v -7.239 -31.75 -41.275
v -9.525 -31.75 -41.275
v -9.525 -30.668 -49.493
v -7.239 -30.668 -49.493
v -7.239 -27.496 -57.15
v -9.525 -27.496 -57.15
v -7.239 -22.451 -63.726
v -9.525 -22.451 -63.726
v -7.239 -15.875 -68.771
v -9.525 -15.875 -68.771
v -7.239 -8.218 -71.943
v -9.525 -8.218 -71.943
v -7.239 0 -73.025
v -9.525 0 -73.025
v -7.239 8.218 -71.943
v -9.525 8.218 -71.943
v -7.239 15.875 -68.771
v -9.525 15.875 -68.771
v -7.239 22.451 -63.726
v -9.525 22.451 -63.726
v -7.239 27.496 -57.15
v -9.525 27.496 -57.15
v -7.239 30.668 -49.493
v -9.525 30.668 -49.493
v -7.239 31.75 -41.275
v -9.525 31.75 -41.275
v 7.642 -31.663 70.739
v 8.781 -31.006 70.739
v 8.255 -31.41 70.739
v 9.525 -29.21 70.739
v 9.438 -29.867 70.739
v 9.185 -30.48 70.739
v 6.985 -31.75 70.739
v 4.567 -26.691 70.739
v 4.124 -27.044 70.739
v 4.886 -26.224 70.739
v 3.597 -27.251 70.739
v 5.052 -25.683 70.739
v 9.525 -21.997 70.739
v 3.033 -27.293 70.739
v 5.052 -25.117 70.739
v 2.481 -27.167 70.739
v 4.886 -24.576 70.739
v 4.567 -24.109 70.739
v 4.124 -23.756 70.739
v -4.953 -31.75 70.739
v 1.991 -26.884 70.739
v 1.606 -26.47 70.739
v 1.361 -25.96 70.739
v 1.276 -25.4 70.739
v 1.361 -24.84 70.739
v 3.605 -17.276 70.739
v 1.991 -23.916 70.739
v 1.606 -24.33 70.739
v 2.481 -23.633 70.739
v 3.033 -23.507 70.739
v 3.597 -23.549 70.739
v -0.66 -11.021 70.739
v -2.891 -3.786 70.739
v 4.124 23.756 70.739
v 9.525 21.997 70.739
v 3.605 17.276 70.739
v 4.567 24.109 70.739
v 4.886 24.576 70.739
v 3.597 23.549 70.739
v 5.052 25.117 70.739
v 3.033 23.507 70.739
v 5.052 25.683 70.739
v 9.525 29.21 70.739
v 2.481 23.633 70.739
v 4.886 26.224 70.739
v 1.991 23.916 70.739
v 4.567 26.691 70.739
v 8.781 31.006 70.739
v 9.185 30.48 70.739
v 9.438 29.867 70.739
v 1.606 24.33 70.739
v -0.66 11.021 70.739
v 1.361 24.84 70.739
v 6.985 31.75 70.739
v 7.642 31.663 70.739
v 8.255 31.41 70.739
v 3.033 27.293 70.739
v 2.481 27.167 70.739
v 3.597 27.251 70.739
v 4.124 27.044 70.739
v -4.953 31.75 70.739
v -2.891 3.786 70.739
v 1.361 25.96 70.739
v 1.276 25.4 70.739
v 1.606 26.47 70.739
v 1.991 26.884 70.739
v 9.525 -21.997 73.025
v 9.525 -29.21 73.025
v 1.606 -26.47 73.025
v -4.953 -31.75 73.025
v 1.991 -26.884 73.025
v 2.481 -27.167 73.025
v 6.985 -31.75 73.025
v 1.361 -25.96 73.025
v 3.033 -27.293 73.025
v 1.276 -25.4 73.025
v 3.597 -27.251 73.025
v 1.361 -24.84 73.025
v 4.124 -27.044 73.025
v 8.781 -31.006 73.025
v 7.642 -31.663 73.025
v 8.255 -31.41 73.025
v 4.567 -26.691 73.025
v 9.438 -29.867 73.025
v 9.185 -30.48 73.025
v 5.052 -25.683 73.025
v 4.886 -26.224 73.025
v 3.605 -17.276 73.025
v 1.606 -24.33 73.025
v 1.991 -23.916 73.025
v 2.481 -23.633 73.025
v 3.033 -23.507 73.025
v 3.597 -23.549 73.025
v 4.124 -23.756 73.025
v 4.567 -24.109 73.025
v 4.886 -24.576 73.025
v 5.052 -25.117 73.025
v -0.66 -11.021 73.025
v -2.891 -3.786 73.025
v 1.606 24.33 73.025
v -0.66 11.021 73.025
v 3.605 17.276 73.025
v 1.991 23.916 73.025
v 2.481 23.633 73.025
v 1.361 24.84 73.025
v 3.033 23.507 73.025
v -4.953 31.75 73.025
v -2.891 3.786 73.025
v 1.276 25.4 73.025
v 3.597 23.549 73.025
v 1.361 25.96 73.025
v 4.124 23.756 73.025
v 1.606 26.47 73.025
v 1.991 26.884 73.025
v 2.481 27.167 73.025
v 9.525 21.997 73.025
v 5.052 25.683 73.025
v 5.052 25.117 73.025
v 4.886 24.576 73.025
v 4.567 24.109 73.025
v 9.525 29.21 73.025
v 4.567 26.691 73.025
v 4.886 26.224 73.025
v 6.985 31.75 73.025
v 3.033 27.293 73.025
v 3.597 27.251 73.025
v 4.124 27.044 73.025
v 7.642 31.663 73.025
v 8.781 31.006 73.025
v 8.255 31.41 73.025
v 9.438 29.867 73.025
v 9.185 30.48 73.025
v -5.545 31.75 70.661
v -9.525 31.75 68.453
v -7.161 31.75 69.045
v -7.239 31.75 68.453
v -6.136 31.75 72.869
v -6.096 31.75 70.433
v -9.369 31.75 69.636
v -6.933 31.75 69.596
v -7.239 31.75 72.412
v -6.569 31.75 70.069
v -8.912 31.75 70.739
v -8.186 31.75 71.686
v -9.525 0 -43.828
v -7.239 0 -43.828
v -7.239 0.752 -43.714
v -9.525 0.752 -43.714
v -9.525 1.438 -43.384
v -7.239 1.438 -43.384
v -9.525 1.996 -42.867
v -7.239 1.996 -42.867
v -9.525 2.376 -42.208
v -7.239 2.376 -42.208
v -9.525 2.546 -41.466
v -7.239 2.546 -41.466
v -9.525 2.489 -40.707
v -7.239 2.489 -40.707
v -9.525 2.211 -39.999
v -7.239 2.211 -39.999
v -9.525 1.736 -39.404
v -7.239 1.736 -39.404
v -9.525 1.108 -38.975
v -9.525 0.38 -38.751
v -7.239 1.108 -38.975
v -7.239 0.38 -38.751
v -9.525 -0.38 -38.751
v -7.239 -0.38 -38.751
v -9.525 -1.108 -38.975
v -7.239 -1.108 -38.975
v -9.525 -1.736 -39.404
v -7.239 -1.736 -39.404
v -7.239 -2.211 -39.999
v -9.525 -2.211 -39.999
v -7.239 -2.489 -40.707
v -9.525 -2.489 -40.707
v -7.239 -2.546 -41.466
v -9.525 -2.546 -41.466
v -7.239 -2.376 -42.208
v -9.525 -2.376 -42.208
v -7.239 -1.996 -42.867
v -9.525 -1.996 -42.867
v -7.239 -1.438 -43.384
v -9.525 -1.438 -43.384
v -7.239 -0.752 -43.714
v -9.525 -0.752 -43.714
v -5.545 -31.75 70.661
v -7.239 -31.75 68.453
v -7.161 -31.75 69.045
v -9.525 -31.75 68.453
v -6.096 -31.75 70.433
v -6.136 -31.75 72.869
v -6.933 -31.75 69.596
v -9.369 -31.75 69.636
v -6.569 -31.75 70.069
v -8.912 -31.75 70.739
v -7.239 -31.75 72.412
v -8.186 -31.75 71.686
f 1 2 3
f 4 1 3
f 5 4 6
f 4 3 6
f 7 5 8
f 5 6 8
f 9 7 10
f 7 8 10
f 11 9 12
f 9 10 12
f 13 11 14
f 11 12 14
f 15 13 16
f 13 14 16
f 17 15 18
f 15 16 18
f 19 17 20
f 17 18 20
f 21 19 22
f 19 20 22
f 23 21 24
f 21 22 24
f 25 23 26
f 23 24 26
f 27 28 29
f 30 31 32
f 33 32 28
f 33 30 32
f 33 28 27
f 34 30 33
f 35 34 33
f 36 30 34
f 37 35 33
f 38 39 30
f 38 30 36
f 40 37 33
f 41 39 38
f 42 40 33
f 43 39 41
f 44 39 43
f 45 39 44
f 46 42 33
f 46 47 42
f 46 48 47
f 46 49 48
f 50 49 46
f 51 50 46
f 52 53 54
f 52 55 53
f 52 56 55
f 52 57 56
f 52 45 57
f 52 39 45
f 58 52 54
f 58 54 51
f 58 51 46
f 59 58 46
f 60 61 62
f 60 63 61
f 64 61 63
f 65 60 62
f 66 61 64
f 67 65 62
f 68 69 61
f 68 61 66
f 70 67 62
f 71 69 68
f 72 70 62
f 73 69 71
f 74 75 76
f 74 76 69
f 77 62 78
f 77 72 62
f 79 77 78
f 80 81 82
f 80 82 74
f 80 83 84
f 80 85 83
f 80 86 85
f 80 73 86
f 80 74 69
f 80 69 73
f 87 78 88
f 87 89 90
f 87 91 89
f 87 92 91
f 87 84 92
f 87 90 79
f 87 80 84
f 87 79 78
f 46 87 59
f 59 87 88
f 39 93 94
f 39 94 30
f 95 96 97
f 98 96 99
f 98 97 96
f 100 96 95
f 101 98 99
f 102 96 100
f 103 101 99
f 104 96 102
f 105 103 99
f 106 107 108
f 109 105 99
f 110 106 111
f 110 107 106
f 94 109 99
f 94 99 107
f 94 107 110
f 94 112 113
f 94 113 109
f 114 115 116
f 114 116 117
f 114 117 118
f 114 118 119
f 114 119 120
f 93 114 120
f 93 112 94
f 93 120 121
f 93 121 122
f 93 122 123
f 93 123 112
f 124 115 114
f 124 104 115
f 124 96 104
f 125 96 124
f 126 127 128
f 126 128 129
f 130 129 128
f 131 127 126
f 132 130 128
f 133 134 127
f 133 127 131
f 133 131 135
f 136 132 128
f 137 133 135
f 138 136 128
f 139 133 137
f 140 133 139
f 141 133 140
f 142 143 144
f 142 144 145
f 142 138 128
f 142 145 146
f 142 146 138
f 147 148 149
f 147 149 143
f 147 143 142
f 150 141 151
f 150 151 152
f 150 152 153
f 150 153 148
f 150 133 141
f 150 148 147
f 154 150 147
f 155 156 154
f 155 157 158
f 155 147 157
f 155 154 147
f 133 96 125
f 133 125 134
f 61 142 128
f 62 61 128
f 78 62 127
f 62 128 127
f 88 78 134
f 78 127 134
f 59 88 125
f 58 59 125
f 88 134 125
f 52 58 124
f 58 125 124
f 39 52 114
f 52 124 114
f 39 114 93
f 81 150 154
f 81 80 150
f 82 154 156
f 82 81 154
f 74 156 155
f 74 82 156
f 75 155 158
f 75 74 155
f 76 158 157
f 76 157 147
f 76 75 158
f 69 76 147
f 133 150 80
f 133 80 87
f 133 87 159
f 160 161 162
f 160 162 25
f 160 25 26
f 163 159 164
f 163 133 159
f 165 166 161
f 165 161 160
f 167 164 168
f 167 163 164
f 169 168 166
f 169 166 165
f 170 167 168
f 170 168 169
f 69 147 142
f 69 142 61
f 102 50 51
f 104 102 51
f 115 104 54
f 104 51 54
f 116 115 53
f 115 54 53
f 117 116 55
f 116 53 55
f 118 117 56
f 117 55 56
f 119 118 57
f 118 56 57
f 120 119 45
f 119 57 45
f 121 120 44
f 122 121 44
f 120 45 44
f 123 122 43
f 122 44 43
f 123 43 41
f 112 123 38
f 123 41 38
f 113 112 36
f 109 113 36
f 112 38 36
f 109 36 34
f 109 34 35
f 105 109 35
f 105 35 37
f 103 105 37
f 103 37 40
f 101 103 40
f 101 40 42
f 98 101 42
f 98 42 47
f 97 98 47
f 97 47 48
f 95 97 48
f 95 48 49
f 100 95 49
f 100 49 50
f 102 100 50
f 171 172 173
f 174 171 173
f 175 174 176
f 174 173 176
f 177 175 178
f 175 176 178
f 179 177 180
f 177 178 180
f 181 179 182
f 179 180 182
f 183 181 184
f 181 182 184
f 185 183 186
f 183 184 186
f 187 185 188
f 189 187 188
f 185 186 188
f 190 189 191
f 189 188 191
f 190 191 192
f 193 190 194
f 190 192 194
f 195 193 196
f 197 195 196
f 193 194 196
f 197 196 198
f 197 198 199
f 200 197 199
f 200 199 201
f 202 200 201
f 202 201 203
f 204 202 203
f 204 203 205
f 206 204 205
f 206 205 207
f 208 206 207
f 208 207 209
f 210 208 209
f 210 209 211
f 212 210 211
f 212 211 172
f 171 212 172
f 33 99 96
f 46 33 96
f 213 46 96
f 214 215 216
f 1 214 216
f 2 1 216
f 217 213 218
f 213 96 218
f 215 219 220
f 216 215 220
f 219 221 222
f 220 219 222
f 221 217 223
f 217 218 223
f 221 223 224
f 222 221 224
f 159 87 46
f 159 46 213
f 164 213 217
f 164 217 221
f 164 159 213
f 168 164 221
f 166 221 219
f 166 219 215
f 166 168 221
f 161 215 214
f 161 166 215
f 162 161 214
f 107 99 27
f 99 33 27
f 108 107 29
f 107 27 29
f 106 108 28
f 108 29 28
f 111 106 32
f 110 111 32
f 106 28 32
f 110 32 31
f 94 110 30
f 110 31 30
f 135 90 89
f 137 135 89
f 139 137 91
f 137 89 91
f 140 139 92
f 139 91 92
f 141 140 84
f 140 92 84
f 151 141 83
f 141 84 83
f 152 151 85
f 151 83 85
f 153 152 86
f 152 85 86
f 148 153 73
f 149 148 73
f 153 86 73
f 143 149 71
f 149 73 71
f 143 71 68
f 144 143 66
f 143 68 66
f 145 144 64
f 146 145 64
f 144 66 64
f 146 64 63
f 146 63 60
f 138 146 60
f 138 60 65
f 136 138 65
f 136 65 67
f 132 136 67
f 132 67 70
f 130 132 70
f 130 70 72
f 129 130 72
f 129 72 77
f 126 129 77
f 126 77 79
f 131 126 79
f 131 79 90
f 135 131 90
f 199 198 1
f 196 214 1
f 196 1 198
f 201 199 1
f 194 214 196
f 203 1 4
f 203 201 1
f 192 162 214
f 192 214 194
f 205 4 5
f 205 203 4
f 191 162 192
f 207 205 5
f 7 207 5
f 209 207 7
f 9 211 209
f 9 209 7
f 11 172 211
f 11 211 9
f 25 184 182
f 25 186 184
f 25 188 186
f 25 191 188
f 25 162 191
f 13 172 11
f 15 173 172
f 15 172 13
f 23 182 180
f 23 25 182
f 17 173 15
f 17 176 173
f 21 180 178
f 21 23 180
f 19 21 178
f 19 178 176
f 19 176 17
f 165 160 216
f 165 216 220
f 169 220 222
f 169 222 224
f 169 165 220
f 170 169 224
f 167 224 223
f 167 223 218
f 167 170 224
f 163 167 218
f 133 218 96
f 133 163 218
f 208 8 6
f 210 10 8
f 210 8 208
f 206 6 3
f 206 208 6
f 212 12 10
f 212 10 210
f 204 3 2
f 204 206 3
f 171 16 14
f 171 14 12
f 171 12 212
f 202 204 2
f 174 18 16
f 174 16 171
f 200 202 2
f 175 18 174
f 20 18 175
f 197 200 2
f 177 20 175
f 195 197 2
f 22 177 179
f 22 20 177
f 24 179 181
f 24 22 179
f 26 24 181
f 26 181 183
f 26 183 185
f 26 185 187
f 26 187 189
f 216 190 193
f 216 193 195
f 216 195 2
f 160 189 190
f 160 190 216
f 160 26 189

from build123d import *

# Parameters (mm, degrees)
BASE_FLANGE1_DEPTH           = 31.75
SKETCH6_R                    = 25.4
CUT_EXTRUDE1_DEPTH           = 150.764450471
FILLET1_R                    = 2.54
CUT_EXTRUDE2_DEPTH           = 82.875610685
F_7_0_201_DIAMETER_HOLE1_D   = 5.1054
F_25_0_1495_DIAMETER_HOLE1_D = 3.7973


# Sheet-metal steps are written as plain solids
with BuildPart() as part:
    # Sketch1 → Base-Flange1 (new, symmetric)
    with BuildSketch(Plane(origin=(0, 0, 0), x_dir=(-1, 0, 0), z_dir=(0, 1, 0))):
        with BuildLine():
            Line((9.525, -73.025), (9.525, 68.453))
            ThreePointArc((9.525, 68.453), (8.185892204, 71.685892204), (4.953, 73.025))
            Line((4.953, 73.025), (-9.525, 73.025))
            Line((-9.525, 73.025), (-9.525, 70.739))
            Line((-9.525, 70.739), (4.953, 70.739))
            ThreePointArc((4.953, 70.739), (6.569446102, 70.069446102), (7.239, 68.453))
            Line((7.239, 68.453), (7.239, -73.025))
            Line((7.239, -73.025), (9.525, -73.025))
        make_face()
    extrude(amount=BASE_FLANGE1_DEPTH, both=True)

    # Sketch6 → Cut-Extrude1 (cut, through all)
    with BuildSketch(Plane.XY.offset(73.025)):
        with Locations((22.225, 0)):
            Circle(SKETCH6_R)
    extrude(amount=-CUT_EXTRUDE1_DEPTH, mode=Mode.SUBTRACT)

    # Fillet1
    fillet1_edges = [part.edges().sort_by_distance(p)[0] for p in [
        (9.525, 31.75, 71.882),
        (9.525, -31.75, 71.882),
    ]]
    fillet(fillet1_edges, radius=FILLET1_R)

    # Sketch7 → Cut-Extrude2 (cut, through all)
    with BuildSketch(Plane(origin=(-9.525, 0, 0), x_dir=(0, -1, 0), z_dir=(-1, 0, 0))):
        with BuildLine():
            Line((-31.75, -41.275), (-31.75, -92.075))
            Line((-31.75, -92.075), (31.75, -92.075))
            Line((31.75, -92.075), (31.75, -41.275))
            ThreePointArc((31.75, -41.275), (0, -73.025), (-31.75, -41.275))
        make_face()
    extrude(amount=-CUT_EXTRUDE2_DEPTH, mode=Mode.SUBTRACT)

    # #7 (0.201) Diameter Hole1 (through all)
    with Locations(Plane.ZY.offset(9.525)):
        with Locations((-41.275, 0)):
            Hole(F_7_0_201_DIAMETER_HOLE1_D / 2)

    # #25 (0.1495) Diameter Hole1 (through all)
    with Locations(Plane.XY.offset(73.025)):
        with Locations((3.175, 25.4), (3.175, -25.4)):
            Hole(F_25_0_1495_DIAMETER_HOLE1_D / 2)


solid = part.part
